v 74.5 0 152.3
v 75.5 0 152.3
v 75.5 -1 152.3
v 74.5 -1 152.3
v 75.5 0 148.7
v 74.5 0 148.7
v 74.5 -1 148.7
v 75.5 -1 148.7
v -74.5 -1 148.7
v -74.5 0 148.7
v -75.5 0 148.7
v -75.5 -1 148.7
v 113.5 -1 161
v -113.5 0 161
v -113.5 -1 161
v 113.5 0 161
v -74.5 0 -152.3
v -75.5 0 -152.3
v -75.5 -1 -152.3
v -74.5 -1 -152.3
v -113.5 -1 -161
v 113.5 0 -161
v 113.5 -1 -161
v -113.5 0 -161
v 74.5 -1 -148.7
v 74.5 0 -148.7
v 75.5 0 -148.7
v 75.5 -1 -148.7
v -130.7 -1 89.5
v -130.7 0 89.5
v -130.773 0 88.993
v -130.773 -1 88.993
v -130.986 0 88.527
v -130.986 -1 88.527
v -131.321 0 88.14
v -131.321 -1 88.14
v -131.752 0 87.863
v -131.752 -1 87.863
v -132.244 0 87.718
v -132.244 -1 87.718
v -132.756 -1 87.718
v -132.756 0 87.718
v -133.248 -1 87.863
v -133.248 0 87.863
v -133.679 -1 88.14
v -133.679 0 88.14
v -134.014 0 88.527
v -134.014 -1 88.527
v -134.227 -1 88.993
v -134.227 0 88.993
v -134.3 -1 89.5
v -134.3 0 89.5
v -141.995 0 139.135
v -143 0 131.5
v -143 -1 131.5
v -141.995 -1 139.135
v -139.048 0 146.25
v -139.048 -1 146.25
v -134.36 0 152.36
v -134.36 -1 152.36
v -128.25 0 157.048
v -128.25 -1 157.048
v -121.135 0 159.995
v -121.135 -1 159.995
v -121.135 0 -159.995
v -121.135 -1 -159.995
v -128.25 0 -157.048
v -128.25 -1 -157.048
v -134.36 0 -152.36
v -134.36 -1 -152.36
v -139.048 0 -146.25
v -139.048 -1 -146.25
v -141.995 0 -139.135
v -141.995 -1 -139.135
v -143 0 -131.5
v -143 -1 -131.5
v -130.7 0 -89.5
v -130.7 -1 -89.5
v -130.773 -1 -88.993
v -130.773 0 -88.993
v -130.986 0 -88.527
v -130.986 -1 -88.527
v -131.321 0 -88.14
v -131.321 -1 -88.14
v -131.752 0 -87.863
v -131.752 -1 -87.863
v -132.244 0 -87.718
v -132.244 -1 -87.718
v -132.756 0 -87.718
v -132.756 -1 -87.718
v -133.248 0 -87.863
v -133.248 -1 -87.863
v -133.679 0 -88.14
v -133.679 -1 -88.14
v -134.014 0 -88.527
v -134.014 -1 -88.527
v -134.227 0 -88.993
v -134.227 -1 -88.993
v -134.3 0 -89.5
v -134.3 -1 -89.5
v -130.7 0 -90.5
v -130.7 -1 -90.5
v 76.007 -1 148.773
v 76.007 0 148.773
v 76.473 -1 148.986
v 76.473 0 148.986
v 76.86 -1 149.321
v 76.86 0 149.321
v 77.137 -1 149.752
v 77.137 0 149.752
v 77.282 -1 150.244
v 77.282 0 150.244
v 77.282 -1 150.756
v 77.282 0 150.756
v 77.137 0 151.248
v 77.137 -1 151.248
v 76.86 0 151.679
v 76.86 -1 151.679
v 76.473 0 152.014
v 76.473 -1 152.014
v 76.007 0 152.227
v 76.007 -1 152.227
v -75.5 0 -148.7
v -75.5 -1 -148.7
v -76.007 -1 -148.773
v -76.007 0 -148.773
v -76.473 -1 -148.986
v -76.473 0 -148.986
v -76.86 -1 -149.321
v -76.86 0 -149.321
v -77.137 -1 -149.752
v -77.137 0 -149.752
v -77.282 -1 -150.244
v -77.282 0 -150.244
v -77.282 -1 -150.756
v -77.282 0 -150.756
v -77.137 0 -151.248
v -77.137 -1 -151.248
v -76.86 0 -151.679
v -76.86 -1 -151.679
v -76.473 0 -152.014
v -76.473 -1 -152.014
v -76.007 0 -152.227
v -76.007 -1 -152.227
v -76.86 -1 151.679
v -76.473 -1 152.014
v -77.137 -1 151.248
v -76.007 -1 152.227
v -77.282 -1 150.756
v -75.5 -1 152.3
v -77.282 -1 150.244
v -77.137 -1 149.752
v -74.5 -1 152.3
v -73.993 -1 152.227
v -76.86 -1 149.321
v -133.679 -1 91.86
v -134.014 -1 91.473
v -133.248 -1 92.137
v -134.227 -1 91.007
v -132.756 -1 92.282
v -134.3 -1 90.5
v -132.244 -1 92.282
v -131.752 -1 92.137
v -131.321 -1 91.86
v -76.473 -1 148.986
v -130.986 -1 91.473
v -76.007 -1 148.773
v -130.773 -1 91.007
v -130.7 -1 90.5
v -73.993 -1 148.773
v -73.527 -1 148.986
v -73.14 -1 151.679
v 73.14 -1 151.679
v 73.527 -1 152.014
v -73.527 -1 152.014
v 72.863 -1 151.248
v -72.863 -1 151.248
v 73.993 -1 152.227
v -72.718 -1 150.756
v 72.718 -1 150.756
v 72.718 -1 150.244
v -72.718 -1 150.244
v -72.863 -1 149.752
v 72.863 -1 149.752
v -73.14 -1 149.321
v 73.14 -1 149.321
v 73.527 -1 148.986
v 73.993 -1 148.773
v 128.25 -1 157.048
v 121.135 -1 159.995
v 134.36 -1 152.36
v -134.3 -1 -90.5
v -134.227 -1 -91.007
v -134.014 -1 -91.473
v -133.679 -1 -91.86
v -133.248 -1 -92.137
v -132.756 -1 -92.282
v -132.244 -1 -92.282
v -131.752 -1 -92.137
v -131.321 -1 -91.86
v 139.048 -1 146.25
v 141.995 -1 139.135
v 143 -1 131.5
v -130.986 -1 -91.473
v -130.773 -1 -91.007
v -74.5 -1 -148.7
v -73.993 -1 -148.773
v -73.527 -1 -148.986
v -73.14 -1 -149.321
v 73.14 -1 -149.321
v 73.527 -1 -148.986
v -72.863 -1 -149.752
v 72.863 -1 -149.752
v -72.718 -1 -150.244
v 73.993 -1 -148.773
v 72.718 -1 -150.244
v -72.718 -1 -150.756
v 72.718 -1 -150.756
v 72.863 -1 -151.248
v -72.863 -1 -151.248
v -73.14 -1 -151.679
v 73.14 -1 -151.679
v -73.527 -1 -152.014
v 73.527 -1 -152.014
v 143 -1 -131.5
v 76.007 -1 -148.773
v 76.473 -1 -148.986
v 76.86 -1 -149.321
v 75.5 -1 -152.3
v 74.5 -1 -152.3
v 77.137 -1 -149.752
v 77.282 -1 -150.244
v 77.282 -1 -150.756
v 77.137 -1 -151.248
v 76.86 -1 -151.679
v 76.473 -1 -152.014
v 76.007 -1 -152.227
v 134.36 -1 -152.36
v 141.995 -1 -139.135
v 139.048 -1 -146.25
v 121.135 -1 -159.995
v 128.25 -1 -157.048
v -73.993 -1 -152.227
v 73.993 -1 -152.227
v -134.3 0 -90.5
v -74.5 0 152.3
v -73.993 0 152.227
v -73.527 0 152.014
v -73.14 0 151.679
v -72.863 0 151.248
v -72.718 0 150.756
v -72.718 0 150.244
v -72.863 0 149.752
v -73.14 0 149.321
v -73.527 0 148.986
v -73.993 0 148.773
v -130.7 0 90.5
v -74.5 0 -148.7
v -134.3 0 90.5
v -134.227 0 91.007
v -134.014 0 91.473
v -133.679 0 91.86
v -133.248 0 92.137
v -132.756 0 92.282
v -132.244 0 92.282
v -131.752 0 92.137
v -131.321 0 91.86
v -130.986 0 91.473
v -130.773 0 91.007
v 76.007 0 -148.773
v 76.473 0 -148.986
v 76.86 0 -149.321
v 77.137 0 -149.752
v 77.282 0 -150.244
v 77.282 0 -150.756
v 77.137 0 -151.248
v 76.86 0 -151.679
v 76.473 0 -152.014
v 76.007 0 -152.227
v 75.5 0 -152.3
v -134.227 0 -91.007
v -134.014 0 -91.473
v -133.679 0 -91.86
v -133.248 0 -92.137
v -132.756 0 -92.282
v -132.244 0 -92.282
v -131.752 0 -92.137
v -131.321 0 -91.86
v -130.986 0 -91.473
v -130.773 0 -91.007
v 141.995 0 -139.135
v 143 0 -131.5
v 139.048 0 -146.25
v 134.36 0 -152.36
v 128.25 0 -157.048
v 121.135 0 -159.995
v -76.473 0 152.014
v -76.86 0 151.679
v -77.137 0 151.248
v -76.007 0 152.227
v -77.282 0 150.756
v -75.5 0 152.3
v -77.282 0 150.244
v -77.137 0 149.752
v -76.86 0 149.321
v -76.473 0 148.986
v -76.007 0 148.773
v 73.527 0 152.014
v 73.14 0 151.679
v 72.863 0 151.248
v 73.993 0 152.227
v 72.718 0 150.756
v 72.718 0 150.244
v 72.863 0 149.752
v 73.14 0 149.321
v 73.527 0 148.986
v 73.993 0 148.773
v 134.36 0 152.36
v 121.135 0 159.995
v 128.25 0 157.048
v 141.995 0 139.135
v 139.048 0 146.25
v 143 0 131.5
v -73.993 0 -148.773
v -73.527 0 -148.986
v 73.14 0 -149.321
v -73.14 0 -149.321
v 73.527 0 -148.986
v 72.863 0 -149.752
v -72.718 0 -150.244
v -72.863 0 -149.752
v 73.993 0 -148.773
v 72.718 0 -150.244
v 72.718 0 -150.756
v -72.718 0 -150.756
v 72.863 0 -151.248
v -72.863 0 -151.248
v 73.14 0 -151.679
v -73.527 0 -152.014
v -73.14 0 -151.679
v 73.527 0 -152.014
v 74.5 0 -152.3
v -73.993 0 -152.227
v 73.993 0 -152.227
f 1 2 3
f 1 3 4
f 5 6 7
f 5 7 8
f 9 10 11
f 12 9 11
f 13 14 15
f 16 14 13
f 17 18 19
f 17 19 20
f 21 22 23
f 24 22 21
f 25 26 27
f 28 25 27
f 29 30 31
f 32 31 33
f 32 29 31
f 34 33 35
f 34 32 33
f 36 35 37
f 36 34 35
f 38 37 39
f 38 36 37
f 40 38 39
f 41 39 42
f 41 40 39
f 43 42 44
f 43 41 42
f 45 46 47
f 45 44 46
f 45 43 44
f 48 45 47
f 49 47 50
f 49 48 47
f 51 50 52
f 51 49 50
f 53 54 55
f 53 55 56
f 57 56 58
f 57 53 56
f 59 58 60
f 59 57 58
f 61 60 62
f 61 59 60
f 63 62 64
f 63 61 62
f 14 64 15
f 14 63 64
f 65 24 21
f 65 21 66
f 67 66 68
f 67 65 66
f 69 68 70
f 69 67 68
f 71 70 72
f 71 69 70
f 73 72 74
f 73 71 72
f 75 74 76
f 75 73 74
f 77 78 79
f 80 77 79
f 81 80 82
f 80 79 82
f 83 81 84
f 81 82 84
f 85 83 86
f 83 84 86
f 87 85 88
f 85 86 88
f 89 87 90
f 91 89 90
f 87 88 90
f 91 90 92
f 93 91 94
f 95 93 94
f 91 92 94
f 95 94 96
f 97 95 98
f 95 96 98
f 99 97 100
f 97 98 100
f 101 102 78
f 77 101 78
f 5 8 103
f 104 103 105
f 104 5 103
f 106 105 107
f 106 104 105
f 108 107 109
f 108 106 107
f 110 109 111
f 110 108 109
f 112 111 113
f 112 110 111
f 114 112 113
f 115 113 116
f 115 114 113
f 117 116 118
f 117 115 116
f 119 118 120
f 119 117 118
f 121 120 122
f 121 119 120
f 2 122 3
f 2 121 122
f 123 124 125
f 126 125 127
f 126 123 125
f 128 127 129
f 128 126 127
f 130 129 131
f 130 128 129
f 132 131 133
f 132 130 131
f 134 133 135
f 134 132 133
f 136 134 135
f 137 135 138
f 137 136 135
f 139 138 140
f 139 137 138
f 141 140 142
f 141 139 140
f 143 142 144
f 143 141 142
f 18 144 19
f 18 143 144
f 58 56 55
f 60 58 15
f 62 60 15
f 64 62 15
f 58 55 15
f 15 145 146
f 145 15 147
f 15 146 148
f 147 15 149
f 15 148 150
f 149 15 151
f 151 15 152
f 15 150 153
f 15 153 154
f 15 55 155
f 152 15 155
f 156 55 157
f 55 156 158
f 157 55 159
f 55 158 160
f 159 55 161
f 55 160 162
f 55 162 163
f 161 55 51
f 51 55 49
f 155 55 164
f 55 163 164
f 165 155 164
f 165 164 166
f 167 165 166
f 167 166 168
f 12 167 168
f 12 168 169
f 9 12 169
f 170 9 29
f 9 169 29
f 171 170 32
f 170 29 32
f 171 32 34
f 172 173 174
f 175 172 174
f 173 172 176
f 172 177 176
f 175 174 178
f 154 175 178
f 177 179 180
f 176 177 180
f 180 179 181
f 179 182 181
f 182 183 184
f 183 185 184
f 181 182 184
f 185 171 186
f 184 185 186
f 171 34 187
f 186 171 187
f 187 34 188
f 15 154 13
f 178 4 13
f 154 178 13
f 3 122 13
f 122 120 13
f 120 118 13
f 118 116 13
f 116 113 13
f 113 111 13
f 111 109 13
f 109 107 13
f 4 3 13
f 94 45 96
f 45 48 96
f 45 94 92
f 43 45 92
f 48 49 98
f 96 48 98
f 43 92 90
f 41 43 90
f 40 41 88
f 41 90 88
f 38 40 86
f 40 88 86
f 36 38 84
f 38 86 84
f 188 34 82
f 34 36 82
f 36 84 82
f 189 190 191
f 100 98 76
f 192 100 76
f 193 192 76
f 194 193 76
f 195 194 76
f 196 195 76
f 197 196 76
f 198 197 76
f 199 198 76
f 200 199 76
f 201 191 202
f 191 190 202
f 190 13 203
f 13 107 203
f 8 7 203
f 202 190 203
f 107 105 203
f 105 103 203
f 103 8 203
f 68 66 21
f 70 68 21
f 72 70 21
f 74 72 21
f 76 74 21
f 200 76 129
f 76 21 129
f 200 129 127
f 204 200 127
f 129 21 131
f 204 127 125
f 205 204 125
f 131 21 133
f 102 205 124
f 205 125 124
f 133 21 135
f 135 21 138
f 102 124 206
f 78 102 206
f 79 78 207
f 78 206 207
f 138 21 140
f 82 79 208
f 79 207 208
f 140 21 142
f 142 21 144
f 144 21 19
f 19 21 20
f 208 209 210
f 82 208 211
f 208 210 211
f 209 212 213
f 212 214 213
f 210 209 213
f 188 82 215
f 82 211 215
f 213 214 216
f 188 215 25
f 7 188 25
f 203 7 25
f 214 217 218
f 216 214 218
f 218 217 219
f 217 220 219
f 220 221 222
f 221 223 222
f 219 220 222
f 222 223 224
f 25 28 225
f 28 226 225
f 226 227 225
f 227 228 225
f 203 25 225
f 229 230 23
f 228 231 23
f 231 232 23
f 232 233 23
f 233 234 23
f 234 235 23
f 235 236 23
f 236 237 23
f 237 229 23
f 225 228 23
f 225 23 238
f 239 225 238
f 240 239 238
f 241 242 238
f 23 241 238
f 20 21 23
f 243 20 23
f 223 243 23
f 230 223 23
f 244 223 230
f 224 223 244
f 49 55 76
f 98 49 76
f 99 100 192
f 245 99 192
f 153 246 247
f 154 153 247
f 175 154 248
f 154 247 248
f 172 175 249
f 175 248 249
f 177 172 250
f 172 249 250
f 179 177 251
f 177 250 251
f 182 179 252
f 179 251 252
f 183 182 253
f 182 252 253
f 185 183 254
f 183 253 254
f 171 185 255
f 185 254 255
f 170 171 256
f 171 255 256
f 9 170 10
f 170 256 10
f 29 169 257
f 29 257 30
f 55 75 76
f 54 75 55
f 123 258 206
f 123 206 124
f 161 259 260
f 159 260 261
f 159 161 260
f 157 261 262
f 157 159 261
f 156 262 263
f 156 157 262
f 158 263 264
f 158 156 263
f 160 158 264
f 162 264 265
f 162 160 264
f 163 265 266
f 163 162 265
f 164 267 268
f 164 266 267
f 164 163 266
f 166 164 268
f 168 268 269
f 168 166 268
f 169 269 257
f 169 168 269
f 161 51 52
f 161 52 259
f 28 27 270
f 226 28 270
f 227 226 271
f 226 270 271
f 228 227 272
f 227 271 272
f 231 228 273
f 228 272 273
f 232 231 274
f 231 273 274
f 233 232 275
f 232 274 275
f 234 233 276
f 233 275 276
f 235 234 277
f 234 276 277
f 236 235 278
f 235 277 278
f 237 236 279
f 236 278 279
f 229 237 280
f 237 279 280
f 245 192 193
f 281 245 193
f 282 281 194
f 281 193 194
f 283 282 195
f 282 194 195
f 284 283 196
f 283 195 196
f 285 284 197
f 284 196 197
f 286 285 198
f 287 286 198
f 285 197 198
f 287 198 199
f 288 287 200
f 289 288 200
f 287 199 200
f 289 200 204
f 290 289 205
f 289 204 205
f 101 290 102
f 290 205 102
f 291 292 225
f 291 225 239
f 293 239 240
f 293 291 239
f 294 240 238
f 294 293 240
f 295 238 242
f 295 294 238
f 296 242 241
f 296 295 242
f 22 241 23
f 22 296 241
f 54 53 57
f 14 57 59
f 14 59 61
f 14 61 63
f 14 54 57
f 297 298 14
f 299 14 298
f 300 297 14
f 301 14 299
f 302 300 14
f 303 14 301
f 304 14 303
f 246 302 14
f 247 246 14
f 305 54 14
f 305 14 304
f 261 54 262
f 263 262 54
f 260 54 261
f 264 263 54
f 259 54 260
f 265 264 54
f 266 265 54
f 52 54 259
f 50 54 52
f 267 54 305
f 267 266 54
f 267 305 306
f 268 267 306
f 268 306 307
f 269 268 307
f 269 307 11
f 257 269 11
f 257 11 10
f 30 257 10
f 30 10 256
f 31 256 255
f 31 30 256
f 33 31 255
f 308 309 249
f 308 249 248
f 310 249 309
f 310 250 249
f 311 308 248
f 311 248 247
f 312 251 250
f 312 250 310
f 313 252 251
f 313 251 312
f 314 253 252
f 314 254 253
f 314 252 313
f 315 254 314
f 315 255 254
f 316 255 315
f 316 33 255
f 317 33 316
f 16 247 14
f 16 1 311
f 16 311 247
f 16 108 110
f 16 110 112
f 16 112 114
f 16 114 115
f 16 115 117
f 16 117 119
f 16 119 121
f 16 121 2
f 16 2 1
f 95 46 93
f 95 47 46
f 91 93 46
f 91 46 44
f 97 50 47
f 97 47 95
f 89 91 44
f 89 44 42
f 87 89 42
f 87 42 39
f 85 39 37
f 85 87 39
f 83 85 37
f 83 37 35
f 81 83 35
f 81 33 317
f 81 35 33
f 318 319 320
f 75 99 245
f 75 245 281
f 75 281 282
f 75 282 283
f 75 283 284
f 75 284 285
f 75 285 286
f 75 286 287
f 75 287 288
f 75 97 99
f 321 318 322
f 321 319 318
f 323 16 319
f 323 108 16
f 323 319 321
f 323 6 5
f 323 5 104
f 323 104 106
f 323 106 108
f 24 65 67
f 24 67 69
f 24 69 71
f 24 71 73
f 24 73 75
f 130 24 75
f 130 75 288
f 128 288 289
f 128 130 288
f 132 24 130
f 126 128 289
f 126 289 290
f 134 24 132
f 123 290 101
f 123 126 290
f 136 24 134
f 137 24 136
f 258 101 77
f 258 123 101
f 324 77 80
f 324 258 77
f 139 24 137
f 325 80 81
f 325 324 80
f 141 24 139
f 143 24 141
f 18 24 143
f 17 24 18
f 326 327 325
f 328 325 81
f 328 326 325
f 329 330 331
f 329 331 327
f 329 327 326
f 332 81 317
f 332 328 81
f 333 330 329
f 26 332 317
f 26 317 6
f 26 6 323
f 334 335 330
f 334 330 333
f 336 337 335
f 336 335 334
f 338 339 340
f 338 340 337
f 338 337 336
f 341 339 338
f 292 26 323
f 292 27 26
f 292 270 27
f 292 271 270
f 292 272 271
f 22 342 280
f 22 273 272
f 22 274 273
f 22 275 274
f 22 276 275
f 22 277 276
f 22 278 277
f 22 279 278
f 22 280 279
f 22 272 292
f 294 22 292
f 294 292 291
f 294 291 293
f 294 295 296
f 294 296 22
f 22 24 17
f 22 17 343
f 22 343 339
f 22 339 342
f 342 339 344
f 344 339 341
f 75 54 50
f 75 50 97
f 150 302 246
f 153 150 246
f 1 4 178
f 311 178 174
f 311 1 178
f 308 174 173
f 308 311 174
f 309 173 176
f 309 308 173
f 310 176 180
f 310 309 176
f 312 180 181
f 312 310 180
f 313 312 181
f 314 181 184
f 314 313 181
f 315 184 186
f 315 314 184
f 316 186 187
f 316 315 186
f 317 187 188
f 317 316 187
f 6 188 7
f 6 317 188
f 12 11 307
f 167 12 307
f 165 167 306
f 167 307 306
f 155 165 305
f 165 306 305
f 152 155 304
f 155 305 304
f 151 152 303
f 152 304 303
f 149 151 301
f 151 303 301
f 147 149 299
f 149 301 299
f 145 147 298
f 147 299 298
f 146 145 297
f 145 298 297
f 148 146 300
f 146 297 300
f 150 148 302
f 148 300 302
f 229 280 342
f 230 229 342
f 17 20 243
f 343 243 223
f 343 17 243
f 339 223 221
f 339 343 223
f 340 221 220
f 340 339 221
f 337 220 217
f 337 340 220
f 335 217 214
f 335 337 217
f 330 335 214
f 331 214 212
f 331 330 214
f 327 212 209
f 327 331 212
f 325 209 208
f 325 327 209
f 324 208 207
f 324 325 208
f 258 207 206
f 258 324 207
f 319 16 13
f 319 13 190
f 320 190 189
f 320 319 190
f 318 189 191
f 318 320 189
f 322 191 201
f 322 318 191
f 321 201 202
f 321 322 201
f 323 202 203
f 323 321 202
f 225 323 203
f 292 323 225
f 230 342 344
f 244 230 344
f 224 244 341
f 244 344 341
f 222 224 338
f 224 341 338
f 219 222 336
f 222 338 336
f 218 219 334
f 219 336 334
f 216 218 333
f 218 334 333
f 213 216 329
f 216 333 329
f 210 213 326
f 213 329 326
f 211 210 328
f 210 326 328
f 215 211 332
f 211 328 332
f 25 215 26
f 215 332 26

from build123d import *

# Parameters (mm, degrees)
SM_BASE_FLANGE_1_DEPTH = 1
CUT_EXTRUDE_1_DEPTH    = 10
CUT_EXTRUDE_2_DEPTH    = 10


# Sheet-metal steps are written as plain solids
with BuildPart() as part:
    # Sketch 1 → Базовая кромка1 (new body)
    with BuildSketch(Plane(origin=(0, 0, 0), x_dir=(1, 0, 0), z_dir=(0, 1, 0))):
        with BuildLine():
            Line((-113.5, -161), (113.5, -161))
            ThreePointArc((113.5, -161), (134.359650045, -152.359650045), (143, -131.5))
            Line((143, -131.5), (143, 131.5))
            ThreePointArc((143, 131.5), (134.359650045, 152.359650045), (113.5, 161))
            Line((113.5, 161), (-113.5, 161))
            ThreePointArc((-113.5, 161), (-134.359650045, 152.359650045), (-143, 131.5))
            Line((-143, 131.5), (-143, -131.5))
            ThreePointArc((-143, -131.5), (-134.359650045, -152.359650045), (-113.5, -161))
        make_face()
    extrude(amount=-SM_BASE_FLANGE_1_DEPTH)

    # Sketch 2 → Вырез-Вытянуть1 (cut)
    with BuildSketch(Plane(origin=(0, 0, 0), x_dir=(1, 0, 0), z_dir=(0, 1, 0))):
        with BuildLine():
            Line((74.5, -148.7), (75.5, -148.7))
            ThreePointArc((75.5, -148.7), (77.3, -150.5), (75.5, -152.3))
            Line((75.5, -152.3), (74.5, -152.3))
            ThreePointArc((74.5, -152.3), (72.7, -150.5), (74.5, -148.7))
        make_face()
        with BuildLine():
            Line((-74.5, -148.7), (-75.5, -148.7))
            ThreePointArc((-75.5, -148.7), (-77.3, -150.5), (-75.5, -152.3))
            Line((-75.5, -152.3), (-74.5, -152.3))
            ThreePointArc((-74.5, -152.3), (-72.7, -150.5), (-74.5, -148.7))
        make_face()
        with BuildLine():
            Line((74.5, 148.7), (75.5, 148.7))
            ThreePointArc((75.5, 148.7), (77.3, 150.5), (75.5, 152.3))
            Line((75.5, 152.3), (74.5, 152.3))
            ThreePointArc((74.5, 152.3), (72.7, 150.5), (74.5, 148.7))
        make_face()
        with BuildLine():
            Line((-74.5, 148.7), (-75.5, 148.7))
            ThreePointArc((-75.5, 148.7), (-77.3, 150.5), (-75.5, 152.3))
            Line((-75.5, 152.3), (-74.5, 152.3))
            ThreePointArc((-74.5, 152.3), (-72.7, 150.5), (-74.5, 148.7))
        make_face()
    extrude(amount=-CUT_EXTRUDE_1_DEPTH, mode=Mode.SUBTRACT)

    # Эскиз3 → Вырез-Вытянуть2 (cut)
    with BuildSketch(Plane.XZ.offset(1)):
        with BuildLine():
            Line((-134.3, 89.5), (-134.3, 90.5))
            ThreePointArc((-134.3, 90.5), (-132.5, 92.3), (-130.7, 90.5))
            Line((-130.7, 90.5), (-130.7, 89.5))
            ThreePointArc((-130.7, 89.5), (-132.5, 87.7), (-134.3, 89.5))
        make_face()
        with BuildLine():
            Line((-134.3, -89.5), (-134.3, -90.5))
            ThreePointArc((-134.3, -90.5), (-132.5, -92.3), (-130.7, -90.5))
            Line((-130.7, -90.5), (-130.7, -89.5))
            ThreePointArc((-130.7, -89.5), (-132.5, -87.7), (-134.3, -89.5))
        make_face()
    extrude(amount=-CUT_EXTRUDE_2_DEPTH, mode=Mode.SUBTRACT)


solid = part.part
